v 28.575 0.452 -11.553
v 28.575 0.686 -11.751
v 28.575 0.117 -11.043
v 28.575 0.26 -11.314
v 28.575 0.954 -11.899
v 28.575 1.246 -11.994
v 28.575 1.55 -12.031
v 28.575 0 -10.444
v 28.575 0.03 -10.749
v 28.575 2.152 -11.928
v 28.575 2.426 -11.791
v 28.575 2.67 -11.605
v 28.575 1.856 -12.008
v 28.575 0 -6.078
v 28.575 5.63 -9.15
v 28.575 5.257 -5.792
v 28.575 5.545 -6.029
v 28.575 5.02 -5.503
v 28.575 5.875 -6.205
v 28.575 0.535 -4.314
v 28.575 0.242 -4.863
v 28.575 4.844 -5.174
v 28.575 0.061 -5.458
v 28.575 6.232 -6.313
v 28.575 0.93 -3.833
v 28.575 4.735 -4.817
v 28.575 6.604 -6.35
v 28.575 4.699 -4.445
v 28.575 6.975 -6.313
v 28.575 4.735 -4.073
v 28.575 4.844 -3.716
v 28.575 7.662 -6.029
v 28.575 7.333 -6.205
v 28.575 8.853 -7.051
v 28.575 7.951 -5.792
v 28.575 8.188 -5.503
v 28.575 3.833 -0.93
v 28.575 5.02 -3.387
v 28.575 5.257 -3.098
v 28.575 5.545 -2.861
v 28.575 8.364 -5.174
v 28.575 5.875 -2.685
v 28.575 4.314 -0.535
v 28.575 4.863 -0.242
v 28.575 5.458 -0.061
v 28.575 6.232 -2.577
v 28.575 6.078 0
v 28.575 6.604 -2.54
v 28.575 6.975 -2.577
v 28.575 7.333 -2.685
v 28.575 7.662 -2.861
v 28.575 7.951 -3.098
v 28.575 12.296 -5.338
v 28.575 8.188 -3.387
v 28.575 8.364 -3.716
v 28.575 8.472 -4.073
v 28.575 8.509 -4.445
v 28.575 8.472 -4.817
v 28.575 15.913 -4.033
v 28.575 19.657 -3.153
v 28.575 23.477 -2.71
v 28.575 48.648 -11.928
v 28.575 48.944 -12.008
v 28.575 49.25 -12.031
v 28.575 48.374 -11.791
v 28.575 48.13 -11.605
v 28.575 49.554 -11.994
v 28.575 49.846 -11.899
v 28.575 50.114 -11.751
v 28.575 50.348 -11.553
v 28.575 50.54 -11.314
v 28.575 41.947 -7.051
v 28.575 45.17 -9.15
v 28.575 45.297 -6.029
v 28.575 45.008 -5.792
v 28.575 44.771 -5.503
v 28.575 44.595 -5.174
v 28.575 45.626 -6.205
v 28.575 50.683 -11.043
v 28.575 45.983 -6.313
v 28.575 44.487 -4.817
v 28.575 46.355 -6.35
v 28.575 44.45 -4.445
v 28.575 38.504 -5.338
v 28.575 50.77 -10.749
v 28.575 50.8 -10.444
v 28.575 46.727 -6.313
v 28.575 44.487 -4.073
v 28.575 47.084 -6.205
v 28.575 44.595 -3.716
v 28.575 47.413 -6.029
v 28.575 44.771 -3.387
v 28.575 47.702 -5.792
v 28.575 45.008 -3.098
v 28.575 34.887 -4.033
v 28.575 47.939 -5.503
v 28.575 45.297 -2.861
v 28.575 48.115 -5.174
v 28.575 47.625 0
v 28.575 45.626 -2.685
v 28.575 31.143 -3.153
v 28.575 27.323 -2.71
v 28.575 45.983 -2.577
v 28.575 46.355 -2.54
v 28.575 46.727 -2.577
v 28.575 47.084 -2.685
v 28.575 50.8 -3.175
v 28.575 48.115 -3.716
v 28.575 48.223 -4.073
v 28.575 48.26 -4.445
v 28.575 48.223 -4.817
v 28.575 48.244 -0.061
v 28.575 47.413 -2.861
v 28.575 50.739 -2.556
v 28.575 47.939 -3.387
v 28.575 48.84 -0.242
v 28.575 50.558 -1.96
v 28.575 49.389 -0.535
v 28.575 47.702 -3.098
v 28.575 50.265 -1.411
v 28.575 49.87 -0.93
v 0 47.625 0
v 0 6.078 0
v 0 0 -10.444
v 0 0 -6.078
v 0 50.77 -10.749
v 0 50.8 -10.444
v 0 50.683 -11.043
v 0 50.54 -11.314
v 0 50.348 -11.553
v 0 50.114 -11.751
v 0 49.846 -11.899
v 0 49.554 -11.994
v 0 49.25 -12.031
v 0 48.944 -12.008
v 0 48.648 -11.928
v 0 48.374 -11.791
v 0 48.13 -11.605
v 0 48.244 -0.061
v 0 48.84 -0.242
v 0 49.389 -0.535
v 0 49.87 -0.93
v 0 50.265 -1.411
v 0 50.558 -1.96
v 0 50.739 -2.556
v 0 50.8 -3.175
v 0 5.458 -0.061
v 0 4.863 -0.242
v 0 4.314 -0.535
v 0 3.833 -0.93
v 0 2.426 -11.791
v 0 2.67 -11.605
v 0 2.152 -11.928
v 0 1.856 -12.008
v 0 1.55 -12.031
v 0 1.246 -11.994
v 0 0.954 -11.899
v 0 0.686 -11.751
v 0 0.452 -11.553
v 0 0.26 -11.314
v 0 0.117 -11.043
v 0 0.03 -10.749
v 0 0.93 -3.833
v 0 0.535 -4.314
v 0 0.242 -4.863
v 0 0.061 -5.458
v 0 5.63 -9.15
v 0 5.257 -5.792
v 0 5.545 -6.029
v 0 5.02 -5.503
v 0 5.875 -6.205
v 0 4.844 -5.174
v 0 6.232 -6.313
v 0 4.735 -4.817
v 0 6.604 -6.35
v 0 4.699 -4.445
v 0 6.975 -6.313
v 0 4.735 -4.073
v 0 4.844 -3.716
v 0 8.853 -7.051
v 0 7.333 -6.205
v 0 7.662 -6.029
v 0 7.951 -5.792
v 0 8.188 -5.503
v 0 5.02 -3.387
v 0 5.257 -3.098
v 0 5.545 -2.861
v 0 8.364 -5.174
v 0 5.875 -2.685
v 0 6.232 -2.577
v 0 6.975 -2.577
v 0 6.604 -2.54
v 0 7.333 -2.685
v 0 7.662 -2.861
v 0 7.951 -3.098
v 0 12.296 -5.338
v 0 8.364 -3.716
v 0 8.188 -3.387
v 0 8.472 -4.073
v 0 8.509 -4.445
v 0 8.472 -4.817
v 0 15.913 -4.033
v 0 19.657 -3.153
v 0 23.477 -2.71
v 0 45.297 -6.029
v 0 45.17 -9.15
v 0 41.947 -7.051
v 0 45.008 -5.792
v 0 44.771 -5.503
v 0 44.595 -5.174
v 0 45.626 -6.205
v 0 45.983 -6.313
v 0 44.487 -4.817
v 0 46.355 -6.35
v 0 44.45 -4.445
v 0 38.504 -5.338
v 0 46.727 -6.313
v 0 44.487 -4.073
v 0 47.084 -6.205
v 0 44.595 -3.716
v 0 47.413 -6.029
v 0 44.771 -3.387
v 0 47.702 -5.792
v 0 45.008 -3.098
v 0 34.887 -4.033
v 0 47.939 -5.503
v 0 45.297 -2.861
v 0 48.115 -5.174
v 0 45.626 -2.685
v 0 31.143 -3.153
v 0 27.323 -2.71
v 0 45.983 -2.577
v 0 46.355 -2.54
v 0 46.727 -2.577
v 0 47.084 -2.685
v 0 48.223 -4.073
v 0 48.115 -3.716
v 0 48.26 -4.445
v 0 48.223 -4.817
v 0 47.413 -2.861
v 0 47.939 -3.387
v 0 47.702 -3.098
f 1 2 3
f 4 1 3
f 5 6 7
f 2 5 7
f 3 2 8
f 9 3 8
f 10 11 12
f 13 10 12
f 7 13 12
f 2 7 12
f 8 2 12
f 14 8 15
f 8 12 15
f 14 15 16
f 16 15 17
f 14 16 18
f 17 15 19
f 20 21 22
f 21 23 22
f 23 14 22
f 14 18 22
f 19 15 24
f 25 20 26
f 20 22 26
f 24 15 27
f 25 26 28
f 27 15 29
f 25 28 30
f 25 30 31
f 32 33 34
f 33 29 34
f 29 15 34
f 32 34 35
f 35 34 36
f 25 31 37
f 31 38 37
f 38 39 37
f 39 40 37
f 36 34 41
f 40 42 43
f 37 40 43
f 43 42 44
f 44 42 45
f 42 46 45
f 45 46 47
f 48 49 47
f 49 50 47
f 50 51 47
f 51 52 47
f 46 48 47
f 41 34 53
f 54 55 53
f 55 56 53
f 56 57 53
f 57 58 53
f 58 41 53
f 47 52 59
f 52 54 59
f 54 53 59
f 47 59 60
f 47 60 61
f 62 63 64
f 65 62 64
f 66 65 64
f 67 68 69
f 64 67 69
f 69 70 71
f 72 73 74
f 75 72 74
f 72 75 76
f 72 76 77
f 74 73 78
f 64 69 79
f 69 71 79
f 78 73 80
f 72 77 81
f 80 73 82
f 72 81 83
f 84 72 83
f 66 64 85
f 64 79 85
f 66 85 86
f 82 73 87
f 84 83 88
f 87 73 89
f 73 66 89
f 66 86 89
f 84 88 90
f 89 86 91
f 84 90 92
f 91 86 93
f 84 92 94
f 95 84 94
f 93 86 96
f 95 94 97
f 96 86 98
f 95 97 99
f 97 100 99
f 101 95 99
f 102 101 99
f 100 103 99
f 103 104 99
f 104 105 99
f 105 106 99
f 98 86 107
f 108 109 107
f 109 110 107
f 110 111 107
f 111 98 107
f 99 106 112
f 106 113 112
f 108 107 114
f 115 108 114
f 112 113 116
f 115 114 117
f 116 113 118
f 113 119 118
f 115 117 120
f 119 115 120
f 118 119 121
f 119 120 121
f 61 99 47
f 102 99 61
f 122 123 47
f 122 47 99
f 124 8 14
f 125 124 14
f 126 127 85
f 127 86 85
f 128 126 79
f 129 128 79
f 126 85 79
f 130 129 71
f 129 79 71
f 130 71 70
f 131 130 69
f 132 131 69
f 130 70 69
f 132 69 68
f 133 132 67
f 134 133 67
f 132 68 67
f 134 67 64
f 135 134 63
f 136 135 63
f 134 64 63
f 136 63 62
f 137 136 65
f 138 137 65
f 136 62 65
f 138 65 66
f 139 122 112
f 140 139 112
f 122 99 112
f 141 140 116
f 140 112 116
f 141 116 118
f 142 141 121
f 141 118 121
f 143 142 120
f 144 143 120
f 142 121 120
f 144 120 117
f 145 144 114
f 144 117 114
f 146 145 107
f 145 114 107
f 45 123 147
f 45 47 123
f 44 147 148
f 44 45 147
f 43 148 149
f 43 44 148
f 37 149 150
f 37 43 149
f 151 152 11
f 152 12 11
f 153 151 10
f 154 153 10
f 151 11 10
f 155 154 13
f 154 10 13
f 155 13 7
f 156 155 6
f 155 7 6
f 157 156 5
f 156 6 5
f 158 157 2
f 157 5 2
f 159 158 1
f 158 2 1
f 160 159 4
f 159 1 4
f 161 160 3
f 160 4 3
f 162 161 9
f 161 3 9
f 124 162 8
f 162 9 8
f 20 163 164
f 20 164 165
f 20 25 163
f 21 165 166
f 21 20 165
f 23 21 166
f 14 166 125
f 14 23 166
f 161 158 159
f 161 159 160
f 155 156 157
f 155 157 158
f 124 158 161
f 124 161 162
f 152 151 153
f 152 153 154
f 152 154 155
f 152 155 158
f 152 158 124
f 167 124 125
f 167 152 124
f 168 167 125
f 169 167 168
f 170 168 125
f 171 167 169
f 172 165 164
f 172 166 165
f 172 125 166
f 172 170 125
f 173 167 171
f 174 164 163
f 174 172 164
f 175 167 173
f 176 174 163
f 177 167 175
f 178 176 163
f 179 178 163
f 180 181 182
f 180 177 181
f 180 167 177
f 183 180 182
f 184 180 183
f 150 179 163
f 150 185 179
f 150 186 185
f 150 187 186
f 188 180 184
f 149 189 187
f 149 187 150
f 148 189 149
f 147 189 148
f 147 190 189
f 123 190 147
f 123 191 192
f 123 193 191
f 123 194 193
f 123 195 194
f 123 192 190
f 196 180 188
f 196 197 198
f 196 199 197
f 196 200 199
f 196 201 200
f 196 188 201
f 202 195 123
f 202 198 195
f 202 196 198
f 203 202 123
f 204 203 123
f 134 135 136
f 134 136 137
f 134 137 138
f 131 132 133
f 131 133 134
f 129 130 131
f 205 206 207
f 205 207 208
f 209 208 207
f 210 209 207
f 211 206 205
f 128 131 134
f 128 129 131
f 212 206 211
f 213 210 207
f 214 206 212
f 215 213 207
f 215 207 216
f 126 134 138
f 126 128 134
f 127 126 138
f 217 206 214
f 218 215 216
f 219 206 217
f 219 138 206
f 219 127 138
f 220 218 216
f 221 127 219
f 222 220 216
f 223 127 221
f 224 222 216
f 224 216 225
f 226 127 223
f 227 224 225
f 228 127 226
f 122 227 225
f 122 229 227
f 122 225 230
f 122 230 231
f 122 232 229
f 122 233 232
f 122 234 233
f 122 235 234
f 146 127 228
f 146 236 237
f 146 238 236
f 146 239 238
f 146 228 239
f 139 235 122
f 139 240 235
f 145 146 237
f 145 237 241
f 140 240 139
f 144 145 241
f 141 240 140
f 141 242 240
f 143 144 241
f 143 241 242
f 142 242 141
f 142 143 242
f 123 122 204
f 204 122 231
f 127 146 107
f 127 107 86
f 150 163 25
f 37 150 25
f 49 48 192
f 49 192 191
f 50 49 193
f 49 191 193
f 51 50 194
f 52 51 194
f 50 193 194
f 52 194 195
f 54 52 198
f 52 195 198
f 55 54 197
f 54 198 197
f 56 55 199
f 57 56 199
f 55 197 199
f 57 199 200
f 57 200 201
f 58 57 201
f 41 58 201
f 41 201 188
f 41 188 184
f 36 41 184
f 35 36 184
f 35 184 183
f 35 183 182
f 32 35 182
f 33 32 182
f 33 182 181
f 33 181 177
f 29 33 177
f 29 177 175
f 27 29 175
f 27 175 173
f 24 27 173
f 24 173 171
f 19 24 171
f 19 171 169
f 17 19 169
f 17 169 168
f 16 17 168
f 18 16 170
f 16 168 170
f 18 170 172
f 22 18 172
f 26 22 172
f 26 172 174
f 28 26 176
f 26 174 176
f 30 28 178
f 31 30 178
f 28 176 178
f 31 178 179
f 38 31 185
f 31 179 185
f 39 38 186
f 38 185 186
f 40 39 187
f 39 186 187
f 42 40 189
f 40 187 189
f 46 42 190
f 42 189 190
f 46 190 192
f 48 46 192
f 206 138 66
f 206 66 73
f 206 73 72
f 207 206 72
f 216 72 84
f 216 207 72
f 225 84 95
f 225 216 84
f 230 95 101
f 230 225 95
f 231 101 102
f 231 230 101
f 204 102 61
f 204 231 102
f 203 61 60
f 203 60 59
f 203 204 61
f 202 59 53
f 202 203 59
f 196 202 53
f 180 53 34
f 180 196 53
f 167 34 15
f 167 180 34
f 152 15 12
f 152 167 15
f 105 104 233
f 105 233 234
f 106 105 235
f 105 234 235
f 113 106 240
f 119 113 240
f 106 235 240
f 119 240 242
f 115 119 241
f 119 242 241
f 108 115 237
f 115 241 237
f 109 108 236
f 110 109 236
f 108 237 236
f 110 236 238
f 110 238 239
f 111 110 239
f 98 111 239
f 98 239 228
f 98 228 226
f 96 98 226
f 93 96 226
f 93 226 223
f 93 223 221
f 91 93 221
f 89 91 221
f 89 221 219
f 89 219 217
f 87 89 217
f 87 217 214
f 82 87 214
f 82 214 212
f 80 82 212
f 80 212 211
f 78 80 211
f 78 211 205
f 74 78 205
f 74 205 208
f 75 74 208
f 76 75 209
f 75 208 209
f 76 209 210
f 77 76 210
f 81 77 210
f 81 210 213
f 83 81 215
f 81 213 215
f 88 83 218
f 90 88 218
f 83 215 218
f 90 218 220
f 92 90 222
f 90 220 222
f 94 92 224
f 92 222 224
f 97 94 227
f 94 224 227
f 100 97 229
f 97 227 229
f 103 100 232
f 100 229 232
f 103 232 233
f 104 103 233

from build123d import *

# Parameters (mm, degrees)
BOSS_EXTRUDE1_DEPTH   = 28.575
CHAMFER1_SIZE         = 4.7625
FILLET1_R             = 3.175
FILLET2_R             = 1.5875
F_8_CLEARANCE_HOLE1_D = 3.81


with BuildPart() as part:
    # Sketch1 → Boss-Extrude1 (new body)
    with BuildSketch(Plane(origin=(0, 0, 0), x_dir=(0, 0, -1), z_dir=(1, 0, 0))):
        with BuildLine():
            Line((0, 0), (0, 50.8))
            Line((0, 50.8), (14.399754562, 50.8))
            ThreePointArc((14.399754562, 50.8), (2.654588994, 25.4), (14.399754562, 0))
            Line((14.399754562, 0), (0, 0))
        make_face()
    extrude(amount=BOSS_EXTRUDE1_DEPTH)

    # Chamfer1
    chamfer1_edges = [part.edges().sort_by_distance(p)[0] for p in [
        (14.2875, 0, 0),
    ]]
    chamfer(chamfer1_edges, length=CHAMFER1_SIZE)

    # Fillet1
    fillet1_edges = [part.edges().sort_by_distance(p)[0] for p in [
        (14.2875, 0, -4.7625),
        (14.2875, 4.7625, 0),
        (14.2875, 50.8, 0),
    ]]
    fillet(fillet1_edges, radius=FILLET1_R)

    # Fillet2
    fillet2_edges = [part.edges().sort_by_distance(p)[0] for p in [
        (14.2875, 50.8, -14.399754562),
        (14.2875, 0, -14.399754562),
    ]]
    fillet(fillet2_edges, radius=FILLET2_R)

    # #8 Clearance Hole1 (through all)
    with Locations(Plane(origin=(28.575, 0, 0), x_dir=(0, 0, -1), z_dir=(1, 0, 0))):
        with Locations((4.445, 46.355), (4.445, 6.603679285)):
            Hole(F_8_CLEARANCE_HOLE1_D / 2)


solid = part.part
